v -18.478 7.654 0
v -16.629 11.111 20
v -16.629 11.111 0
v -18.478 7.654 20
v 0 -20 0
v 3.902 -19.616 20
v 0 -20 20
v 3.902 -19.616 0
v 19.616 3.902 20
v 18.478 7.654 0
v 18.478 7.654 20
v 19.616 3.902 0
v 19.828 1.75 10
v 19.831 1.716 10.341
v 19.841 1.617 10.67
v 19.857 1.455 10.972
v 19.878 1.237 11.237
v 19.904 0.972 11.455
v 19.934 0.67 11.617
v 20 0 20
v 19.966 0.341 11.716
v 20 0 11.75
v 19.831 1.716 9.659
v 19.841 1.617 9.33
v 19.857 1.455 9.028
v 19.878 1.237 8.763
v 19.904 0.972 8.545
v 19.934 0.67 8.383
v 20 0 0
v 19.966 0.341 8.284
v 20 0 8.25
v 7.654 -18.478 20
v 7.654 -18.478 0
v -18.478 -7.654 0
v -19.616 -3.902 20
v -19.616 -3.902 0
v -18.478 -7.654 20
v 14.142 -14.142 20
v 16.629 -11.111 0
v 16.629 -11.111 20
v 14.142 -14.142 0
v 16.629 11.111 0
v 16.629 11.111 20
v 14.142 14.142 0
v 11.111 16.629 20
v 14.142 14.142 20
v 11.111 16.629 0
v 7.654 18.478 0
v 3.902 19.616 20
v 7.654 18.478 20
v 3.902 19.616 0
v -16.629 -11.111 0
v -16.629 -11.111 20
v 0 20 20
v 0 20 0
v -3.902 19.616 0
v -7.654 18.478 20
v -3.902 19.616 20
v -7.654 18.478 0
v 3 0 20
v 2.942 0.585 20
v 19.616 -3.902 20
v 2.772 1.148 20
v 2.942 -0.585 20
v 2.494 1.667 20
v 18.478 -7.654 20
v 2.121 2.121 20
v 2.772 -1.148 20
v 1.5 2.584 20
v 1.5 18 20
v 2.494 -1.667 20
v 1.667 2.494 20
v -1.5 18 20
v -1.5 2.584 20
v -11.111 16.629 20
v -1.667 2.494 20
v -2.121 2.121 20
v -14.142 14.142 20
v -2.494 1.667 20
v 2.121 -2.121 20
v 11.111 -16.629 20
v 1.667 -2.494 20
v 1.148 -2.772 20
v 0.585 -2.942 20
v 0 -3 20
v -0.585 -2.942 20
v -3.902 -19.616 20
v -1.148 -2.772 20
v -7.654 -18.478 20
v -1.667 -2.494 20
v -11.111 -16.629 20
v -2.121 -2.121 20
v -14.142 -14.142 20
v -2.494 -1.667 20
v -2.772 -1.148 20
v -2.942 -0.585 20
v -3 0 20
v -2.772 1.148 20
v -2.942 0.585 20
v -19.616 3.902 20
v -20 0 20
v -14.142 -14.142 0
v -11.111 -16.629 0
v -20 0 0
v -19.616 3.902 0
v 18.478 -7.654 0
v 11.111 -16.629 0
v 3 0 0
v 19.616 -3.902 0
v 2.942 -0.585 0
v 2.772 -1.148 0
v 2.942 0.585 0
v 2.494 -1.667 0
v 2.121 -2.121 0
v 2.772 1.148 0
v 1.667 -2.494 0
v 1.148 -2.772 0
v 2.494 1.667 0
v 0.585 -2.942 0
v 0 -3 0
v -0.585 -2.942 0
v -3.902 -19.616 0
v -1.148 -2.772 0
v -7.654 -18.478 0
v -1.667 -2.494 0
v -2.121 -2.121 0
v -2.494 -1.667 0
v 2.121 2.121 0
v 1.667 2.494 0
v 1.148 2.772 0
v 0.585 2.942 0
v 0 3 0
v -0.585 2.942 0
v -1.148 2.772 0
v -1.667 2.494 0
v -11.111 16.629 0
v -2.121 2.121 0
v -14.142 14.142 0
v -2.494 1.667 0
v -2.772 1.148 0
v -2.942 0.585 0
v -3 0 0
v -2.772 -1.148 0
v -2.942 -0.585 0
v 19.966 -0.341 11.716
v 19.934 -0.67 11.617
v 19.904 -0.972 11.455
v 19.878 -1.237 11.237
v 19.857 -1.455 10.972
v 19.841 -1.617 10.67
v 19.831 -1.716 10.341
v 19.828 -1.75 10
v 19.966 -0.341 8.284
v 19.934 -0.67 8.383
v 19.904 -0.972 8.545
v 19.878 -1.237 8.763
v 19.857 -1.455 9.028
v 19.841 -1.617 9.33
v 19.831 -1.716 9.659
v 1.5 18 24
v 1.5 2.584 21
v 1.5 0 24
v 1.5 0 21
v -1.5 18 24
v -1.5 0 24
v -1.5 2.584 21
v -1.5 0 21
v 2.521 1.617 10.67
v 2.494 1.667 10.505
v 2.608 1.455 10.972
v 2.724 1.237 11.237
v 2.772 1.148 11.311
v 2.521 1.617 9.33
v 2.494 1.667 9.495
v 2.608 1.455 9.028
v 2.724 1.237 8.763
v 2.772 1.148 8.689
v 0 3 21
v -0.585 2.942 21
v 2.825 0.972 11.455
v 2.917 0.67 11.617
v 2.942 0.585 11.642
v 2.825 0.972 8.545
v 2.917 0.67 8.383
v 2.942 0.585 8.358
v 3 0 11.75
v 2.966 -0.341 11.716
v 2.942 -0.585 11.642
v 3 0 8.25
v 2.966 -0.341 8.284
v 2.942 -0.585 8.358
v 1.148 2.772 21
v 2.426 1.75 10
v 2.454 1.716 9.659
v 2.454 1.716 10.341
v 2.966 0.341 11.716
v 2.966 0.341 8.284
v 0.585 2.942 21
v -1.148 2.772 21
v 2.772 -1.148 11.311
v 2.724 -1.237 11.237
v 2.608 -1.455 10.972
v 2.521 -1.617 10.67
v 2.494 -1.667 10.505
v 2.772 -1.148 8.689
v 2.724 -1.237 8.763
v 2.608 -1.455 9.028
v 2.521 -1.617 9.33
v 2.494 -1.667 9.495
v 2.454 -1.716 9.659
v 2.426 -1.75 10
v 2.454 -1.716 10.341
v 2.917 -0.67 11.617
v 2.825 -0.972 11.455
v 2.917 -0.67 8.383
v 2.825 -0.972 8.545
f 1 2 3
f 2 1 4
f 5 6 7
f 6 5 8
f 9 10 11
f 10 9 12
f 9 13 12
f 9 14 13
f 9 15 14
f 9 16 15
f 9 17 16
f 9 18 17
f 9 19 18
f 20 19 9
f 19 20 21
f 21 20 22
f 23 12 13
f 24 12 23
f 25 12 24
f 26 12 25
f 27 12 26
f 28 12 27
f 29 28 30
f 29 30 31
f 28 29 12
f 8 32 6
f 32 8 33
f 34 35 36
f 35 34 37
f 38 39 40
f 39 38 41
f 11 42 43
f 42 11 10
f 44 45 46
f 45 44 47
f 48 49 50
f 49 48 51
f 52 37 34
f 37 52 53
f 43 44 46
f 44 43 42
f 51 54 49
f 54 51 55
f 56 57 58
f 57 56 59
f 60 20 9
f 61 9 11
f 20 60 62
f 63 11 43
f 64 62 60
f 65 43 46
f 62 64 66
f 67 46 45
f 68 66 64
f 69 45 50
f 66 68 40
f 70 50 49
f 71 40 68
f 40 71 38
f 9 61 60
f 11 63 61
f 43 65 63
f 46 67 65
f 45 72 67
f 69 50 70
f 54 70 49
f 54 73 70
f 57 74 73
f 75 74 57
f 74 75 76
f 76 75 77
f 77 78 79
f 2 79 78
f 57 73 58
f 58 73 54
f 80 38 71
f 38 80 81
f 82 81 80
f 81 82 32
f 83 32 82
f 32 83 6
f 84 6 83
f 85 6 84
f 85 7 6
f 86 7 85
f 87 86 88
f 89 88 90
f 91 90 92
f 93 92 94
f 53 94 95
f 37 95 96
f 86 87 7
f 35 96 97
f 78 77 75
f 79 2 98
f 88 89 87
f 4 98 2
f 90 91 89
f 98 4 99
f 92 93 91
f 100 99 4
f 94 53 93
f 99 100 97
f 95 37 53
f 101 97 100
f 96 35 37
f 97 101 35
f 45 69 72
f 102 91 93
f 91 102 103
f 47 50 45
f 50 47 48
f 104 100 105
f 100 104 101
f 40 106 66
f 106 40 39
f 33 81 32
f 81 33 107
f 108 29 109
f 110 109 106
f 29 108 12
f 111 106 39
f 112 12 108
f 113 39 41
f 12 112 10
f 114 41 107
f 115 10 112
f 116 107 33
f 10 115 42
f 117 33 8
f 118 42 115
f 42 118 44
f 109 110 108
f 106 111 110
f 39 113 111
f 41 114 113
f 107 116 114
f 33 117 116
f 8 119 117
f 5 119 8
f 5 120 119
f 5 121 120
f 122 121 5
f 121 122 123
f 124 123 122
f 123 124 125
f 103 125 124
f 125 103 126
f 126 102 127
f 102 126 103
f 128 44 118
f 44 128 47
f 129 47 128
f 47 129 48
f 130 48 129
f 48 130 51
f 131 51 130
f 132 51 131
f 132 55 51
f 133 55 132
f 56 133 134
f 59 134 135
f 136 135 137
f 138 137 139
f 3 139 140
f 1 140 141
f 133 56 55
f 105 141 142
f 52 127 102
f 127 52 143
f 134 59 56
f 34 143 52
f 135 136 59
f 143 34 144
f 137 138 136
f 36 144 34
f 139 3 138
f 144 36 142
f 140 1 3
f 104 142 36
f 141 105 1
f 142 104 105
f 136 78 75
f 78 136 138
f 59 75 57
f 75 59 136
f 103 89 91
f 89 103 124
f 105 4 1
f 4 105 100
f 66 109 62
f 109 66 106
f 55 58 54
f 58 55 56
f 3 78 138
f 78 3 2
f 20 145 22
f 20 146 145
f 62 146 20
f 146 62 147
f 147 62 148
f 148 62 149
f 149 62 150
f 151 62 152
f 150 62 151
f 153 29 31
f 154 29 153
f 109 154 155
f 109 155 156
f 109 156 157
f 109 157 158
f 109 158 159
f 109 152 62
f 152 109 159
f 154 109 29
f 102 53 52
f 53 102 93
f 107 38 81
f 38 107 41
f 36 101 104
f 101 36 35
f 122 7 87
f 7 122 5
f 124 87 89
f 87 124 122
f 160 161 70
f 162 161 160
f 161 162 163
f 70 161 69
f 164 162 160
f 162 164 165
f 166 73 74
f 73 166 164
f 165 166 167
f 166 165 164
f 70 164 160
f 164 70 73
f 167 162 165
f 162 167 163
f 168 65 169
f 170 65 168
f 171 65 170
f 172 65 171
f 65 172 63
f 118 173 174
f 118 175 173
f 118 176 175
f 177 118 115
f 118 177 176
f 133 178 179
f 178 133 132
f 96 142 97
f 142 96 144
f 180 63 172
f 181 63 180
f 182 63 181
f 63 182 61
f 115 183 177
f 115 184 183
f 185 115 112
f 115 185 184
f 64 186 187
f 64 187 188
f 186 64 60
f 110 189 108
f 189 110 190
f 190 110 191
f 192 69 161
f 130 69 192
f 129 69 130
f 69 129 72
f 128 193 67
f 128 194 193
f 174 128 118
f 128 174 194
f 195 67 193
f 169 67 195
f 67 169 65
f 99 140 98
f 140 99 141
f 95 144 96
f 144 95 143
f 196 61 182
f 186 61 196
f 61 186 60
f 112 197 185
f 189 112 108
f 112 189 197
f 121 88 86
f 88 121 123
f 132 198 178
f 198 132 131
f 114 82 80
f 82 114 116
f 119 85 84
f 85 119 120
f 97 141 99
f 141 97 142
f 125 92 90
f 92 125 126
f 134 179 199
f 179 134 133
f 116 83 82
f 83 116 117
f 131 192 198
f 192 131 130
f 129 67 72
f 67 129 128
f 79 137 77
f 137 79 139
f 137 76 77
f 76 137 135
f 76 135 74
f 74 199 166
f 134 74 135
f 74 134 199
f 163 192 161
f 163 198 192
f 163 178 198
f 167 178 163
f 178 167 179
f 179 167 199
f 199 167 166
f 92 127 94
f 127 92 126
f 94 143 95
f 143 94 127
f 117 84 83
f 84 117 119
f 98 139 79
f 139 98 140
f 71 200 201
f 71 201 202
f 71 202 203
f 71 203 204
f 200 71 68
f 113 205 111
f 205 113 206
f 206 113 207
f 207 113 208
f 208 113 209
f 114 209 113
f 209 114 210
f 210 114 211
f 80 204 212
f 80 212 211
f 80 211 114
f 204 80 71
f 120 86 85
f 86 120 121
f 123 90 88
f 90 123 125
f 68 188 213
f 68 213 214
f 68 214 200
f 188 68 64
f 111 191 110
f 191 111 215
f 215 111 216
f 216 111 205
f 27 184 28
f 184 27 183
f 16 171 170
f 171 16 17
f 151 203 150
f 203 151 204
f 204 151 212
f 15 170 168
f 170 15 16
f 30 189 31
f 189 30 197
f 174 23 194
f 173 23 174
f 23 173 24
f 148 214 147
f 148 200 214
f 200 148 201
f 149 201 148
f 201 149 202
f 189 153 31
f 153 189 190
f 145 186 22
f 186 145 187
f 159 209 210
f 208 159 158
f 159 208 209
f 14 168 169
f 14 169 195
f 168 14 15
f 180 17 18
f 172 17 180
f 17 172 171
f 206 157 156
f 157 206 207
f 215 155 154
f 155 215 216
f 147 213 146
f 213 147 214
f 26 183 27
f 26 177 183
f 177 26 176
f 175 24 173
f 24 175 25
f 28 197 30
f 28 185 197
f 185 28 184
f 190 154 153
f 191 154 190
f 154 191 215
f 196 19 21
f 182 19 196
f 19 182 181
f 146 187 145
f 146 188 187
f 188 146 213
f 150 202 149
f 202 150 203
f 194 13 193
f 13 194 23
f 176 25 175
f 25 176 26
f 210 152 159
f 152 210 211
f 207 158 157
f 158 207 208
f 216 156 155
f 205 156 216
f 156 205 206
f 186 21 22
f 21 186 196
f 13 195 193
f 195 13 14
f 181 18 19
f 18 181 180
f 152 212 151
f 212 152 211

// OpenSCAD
$fn = 32;

// ----------------------------------------------------------------------
// Control knob: pointer knob
// ----------------------------------------------------------------------

// --- parameters (mm) ---
rib_w = 3;                // pointer rib width
rib_h = 5;                // pointer rib height
knob_d = 40;              // knob body diameter
knob_h = 20;              // knob body height
bore_d = 6;               // shaft bore diameter
set_d = 3.5;              // set screw bore diameter

rib_poke = rib_h - 1;  // rib height above the top
total_h = knob_h + rib_h - 1;  // overall height

difference() {
  union() {
    cylinder(h = knob_h, d = knob_d);
    translate([-rib_w / 2, 0, knob_h - 1])
      cube([rib_w, knob_d / 2 - 2, rib_h]);
  }
  translate([0, 0, -1]) cylinder(h = knob_h + 2, d = bore_d);
  translate([-1, 0, knob_h / 2]) rotate([0, 90, 0])
    cylinder(h = knob_d / 2 + bore_d / 2 + 2, d = set_d);}
